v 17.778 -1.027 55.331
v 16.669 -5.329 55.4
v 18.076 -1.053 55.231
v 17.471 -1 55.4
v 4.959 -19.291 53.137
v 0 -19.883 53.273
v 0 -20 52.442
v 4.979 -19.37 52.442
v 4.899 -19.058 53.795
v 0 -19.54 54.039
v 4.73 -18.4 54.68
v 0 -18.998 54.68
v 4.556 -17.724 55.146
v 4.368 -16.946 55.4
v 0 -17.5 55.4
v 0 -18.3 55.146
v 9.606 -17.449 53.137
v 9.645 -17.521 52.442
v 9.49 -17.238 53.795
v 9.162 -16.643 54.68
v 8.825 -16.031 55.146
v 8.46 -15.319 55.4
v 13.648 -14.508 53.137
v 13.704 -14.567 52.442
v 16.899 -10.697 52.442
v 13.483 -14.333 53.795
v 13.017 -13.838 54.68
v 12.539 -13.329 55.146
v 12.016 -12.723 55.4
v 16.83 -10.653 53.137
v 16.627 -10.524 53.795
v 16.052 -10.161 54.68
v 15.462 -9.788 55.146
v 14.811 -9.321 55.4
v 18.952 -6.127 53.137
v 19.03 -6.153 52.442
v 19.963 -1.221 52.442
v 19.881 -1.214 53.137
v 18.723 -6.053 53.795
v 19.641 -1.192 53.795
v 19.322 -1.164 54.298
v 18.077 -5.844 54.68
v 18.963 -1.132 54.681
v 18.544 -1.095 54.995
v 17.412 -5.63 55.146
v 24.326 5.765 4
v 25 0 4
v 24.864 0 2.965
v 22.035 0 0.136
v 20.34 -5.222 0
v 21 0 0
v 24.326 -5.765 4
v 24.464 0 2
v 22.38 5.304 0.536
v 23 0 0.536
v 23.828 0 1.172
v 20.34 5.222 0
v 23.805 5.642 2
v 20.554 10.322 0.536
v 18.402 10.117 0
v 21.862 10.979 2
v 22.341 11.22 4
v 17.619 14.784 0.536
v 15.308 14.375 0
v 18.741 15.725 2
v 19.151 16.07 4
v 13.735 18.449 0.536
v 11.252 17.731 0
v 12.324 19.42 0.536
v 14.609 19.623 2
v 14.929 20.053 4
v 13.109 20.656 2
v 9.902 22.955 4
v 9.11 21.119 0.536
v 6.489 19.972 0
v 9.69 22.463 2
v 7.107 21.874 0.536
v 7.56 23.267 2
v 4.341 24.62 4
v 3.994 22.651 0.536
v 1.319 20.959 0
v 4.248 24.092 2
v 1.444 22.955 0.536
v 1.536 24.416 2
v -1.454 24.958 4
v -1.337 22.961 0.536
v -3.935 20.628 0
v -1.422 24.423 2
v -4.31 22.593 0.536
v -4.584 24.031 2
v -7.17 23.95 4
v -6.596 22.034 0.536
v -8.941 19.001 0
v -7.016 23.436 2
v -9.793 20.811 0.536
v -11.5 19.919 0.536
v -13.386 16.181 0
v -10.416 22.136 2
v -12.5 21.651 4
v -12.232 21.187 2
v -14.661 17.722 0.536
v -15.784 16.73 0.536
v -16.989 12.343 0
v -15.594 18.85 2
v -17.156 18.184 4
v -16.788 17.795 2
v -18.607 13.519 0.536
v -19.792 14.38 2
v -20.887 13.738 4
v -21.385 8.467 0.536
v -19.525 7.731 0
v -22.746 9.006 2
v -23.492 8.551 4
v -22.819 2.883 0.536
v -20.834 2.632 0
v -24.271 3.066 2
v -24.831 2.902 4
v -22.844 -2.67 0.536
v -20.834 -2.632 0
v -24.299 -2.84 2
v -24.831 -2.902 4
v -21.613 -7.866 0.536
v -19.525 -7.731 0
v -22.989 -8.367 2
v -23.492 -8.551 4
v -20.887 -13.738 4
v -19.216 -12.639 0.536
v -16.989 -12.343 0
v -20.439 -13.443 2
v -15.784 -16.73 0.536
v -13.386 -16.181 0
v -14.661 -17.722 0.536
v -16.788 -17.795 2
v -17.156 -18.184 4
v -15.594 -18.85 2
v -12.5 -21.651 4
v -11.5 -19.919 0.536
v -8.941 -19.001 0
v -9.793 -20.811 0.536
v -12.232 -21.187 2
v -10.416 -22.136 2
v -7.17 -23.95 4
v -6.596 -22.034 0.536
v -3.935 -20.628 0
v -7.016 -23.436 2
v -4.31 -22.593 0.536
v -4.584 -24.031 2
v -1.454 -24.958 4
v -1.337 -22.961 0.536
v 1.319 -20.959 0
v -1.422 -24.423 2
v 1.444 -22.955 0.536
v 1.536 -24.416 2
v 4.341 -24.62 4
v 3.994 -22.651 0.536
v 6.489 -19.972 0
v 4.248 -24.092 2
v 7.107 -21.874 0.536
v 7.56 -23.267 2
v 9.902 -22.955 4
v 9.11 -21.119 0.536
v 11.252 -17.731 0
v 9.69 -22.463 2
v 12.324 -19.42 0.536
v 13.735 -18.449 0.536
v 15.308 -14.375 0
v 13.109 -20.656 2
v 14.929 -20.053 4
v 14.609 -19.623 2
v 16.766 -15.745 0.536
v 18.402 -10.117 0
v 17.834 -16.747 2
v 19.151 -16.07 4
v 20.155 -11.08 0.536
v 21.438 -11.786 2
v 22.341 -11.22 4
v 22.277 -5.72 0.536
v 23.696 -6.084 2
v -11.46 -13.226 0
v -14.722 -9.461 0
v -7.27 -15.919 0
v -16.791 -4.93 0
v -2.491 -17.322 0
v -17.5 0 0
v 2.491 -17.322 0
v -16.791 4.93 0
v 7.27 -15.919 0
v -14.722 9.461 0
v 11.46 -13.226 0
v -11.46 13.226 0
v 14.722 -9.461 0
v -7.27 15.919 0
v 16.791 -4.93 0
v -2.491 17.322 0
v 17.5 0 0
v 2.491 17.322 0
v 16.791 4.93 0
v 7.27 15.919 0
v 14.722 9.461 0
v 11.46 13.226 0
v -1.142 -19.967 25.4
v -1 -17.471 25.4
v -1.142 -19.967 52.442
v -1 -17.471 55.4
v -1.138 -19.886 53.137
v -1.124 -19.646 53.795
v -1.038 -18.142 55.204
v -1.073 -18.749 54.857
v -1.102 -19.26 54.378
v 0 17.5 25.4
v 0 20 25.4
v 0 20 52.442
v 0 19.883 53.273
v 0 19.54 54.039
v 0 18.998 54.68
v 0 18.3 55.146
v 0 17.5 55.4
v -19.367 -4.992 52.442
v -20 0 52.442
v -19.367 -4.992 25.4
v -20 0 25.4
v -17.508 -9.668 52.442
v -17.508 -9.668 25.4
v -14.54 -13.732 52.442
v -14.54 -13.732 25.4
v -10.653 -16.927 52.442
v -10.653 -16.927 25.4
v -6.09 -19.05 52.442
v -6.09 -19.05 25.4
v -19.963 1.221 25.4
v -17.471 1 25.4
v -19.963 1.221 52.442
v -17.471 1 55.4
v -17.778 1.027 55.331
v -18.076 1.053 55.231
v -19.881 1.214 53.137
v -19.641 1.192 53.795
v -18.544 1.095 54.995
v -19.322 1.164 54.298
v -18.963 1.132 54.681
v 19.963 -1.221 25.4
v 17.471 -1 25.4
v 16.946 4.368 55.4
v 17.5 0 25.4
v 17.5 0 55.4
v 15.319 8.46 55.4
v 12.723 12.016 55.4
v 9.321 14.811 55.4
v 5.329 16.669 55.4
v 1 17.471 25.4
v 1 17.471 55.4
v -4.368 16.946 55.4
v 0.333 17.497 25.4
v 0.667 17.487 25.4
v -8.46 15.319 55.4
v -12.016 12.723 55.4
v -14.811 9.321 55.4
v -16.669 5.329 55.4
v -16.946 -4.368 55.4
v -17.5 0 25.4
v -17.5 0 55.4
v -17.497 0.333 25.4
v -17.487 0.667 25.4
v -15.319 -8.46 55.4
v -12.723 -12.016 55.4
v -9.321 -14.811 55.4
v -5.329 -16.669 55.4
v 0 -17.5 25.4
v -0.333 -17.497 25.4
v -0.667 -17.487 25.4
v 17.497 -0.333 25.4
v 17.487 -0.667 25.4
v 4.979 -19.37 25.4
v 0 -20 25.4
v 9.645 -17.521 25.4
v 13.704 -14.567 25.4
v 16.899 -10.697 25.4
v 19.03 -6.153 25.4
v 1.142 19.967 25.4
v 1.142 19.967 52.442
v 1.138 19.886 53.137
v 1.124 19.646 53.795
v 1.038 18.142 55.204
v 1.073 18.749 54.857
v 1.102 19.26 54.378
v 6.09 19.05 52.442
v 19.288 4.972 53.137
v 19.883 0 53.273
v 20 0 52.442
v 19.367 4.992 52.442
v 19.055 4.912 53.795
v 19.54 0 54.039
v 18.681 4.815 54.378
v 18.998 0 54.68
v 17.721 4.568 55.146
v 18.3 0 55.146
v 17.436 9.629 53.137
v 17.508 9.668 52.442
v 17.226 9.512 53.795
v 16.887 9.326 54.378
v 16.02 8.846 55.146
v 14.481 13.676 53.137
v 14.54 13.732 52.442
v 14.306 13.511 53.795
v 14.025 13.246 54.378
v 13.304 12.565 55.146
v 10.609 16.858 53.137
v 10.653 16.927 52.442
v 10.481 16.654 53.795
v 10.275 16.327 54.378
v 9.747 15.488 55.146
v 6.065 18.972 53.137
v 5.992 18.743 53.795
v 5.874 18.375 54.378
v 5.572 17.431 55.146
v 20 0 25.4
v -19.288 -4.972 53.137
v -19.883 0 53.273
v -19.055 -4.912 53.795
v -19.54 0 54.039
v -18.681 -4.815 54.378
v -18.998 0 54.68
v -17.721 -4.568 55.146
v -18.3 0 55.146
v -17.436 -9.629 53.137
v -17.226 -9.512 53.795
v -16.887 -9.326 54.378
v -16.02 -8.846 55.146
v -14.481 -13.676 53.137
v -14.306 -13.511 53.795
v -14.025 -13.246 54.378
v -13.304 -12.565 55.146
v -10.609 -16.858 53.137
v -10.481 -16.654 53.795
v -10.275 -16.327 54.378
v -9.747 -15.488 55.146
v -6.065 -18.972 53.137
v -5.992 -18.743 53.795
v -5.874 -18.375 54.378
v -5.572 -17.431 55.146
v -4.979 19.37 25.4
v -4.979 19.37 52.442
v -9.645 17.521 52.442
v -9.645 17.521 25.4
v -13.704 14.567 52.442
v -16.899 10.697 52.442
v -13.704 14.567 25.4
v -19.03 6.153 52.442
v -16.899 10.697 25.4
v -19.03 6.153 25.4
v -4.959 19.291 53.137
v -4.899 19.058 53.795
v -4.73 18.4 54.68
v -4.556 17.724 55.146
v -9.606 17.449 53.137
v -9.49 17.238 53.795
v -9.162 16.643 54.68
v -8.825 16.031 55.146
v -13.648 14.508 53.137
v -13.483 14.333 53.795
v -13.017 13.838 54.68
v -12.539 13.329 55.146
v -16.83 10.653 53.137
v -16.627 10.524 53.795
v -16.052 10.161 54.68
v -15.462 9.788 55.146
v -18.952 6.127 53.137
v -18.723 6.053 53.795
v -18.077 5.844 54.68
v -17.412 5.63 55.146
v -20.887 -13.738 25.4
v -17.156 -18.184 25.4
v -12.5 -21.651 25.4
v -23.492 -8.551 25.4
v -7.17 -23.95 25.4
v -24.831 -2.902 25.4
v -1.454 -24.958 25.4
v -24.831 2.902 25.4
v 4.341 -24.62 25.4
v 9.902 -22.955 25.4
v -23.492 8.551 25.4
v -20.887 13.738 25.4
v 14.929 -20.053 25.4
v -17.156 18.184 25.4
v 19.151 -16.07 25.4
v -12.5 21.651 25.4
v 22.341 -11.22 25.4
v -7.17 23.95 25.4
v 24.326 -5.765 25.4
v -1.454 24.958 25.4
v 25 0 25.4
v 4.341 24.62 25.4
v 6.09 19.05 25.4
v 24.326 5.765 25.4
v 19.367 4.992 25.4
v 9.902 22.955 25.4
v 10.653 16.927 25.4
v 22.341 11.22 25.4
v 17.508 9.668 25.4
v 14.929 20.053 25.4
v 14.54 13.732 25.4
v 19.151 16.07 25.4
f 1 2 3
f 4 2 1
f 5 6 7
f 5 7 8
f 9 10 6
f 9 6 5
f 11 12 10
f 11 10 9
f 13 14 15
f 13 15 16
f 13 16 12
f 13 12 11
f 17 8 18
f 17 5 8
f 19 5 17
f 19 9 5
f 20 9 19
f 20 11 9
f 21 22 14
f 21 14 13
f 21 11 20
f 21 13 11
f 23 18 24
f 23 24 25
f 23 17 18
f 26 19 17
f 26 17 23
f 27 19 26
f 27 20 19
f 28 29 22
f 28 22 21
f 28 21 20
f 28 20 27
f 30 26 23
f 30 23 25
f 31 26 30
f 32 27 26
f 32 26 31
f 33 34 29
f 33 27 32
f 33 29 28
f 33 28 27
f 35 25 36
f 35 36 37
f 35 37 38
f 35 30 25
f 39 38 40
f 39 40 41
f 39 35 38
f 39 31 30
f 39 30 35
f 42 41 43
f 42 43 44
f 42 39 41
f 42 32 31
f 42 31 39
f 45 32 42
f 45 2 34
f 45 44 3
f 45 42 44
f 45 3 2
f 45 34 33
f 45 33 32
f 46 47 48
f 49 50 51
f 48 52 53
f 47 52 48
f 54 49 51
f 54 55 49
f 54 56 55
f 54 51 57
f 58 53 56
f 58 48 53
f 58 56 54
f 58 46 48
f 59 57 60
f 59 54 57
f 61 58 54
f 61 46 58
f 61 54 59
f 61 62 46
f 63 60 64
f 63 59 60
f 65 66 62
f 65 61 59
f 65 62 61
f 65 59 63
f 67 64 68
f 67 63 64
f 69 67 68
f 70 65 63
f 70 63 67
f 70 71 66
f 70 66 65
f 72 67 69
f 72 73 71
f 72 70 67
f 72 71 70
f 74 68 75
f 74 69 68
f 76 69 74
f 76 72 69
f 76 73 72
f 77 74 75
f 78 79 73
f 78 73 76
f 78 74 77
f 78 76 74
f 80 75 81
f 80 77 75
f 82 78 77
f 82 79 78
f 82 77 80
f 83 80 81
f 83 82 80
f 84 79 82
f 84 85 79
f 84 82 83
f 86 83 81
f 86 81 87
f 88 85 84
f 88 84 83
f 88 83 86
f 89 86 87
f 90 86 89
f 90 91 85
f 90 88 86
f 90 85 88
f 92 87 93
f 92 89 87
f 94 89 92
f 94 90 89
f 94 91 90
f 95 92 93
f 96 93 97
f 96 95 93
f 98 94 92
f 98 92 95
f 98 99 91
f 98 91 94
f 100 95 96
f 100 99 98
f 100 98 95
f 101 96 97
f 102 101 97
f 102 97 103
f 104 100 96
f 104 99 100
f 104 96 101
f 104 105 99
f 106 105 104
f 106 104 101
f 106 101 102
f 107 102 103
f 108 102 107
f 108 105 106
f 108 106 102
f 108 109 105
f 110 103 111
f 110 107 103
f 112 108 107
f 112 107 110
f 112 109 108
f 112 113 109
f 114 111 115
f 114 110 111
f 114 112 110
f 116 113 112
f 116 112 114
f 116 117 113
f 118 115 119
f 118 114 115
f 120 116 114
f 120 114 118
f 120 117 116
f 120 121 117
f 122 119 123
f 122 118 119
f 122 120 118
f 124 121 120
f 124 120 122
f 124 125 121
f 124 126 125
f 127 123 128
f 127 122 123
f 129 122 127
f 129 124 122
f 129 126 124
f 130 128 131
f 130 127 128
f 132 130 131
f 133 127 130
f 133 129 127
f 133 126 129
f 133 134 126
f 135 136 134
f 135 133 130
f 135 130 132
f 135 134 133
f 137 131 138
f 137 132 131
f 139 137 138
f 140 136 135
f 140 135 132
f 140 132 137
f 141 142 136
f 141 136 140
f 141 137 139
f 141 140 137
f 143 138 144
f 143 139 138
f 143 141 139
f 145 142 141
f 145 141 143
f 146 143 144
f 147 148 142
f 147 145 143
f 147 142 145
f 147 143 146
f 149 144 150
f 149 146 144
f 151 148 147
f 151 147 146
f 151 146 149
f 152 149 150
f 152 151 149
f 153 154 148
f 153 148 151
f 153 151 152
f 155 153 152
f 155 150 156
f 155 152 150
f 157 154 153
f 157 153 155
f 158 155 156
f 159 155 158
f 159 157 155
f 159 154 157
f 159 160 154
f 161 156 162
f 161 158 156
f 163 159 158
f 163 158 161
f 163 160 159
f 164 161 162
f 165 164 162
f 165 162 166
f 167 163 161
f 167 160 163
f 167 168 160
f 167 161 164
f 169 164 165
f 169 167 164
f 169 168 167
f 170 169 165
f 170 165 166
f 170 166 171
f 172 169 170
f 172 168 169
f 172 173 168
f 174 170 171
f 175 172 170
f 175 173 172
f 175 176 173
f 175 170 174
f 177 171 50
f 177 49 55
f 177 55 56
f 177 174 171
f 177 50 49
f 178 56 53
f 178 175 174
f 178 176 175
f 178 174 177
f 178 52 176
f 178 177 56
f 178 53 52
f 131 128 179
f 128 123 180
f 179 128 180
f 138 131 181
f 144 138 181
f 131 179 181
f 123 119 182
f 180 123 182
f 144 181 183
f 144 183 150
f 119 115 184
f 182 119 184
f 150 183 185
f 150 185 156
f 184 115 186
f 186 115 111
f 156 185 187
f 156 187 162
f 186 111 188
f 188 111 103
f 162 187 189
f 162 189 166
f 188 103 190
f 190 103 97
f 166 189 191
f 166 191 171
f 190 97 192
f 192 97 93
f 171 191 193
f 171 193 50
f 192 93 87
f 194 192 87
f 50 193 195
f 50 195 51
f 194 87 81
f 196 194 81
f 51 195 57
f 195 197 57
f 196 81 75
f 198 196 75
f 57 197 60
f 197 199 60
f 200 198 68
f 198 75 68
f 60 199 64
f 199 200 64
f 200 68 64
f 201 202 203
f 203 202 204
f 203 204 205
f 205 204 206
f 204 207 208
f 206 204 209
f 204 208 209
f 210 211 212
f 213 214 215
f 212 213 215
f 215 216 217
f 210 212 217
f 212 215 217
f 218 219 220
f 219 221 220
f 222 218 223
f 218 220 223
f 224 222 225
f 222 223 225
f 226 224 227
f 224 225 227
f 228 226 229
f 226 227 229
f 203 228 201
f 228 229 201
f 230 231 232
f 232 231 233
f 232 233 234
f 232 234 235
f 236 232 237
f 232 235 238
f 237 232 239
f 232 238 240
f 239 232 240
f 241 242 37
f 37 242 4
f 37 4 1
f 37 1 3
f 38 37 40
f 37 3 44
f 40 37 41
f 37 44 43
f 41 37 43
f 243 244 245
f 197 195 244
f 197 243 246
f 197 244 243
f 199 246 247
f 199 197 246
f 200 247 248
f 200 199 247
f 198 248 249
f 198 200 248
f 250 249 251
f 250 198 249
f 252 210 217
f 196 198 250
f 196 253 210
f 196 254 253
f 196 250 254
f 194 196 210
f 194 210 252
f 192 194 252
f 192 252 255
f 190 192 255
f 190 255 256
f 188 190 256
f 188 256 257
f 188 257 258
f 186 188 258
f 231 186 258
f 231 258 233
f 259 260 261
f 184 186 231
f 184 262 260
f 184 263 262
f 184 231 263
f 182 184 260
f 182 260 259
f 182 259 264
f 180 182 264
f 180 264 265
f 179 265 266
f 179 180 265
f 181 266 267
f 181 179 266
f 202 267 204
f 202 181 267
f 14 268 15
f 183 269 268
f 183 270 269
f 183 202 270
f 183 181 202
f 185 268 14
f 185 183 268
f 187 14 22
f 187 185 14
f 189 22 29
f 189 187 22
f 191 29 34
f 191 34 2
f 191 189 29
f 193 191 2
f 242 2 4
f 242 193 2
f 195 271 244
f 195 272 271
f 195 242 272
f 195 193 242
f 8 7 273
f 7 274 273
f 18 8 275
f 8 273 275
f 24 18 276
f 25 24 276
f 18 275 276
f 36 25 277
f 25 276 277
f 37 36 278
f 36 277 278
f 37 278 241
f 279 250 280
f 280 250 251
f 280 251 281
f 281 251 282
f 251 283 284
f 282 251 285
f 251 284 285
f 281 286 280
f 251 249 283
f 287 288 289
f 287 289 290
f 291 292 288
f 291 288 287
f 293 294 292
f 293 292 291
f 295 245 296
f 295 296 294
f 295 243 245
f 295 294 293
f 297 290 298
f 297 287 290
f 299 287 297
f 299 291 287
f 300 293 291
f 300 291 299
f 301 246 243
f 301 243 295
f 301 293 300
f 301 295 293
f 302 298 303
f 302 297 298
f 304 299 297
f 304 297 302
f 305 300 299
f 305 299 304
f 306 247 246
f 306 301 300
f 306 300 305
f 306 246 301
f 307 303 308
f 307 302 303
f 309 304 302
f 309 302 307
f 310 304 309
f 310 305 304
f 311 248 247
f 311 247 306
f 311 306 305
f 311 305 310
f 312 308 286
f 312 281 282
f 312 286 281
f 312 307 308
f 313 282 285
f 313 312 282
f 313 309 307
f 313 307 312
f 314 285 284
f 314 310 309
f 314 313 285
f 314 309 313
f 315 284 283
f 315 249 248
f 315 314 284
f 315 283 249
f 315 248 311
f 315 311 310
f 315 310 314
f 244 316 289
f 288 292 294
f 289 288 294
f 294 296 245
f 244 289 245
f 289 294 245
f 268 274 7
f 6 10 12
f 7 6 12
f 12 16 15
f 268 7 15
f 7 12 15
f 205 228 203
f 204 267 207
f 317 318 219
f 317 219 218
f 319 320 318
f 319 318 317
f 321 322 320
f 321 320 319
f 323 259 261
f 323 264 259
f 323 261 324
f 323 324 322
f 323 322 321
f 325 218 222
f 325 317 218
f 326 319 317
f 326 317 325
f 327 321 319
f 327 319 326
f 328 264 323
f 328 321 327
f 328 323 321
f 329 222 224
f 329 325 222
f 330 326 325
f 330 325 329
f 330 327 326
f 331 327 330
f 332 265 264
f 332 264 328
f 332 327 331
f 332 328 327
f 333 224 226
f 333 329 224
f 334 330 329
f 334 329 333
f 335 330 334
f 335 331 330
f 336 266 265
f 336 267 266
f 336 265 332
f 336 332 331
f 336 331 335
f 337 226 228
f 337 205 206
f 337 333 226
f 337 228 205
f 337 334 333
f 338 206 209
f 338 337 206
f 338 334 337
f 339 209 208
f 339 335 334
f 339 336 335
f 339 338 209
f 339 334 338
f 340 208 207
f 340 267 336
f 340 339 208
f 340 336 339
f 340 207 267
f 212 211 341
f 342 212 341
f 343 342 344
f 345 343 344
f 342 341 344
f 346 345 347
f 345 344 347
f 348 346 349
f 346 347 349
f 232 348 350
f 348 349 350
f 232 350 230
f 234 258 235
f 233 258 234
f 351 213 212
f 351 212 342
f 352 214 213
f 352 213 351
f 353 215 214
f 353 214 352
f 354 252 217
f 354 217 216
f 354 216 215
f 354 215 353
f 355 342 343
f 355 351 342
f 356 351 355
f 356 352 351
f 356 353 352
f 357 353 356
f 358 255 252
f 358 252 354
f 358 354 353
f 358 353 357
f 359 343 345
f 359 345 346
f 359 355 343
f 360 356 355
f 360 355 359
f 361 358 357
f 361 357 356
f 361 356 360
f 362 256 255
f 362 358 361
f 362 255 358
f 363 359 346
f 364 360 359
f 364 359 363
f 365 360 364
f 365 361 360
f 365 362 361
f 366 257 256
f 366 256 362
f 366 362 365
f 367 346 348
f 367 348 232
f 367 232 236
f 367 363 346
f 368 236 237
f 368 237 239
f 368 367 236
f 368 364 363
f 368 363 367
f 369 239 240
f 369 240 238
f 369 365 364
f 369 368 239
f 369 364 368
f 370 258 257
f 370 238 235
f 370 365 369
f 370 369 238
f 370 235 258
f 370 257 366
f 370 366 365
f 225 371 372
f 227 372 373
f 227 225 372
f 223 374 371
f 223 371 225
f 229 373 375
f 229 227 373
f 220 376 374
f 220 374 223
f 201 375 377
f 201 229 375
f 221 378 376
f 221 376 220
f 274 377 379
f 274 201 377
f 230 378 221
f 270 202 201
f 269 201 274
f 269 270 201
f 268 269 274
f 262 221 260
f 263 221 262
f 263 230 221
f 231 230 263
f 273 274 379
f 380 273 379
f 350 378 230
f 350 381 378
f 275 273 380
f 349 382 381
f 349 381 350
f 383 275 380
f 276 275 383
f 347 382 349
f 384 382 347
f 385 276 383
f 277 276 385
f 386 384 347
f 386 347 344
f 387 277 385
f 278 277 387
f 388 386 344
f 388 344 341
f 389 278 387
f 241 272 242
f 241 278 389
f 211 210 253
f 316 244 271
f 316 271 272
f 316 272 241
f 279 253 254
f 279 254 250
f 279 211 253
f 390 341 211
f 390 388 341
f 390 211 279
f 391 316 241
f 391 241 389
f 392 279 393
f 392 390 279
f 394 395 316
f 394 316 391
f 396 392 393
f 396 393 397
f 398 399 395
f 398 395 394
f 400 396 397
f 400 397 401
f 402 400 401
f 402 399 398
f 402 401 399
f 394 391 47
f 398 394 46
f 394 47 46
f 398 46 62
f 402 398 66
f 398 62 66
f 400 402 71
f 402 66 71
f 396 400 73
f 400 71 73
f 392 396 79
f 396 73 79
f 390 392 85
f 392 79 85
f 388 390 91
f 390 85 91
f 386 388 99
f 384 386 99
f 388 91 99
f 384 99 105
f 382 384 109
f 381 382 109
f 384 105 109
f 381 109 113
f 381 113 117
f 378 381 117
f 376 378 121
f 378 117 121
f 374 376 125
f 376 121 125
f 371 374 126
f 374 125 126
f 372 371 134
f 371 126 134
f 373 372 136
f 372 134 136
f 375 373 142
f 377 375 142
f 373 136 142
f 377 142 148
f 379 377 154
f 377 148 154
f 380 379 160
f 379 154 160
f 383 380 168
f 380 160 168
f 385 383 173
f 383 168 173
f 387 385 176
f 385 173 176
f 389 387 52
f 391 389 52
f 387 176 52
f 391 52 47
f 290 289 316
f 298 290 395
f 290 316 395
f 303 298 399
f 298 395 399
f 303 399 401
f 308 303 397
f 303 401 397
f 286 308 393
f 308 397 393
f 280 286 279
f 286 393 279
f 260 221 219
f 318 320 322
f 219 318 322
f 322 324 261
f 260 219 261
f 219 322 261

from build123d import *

# Parameters (mm, degrees)
F0_R        = 25
F0_R_2      = 20
F0_R_3      = 17.5
F1_DEPTH    = 25.4
F2_DEPTH    = 55.4
F4_DEPTH    = 30
F5_T2_ANGLE = 128.886649626
F5_T4_ANGLE = 129.1121145727
F5_T6_ANGLE = 128.886649626
F5_T8_ANGLE = 129.1121145727
F6_R        = 4


# Not quite as in the source:
# - a fillet or chamfer that OpenCascade refuses, or shapes differently, is made with other operations: its cross-section is extruded or revolved along the edge and cut away or added


with BuildPart() as f1:
    # F0 (on Top) → F1 (new body)
    with BuildSketch(Plane.XY):
        Circle(F0_R)
        Circle(F0_R_2, mode=Mode.SUBTRACT)
        Circle(F0_R_2)
        Circle(F0_R_3, mode=Mode.SUBTRACT)
    extrude(amount=F1_DEPTH)

    # F0 (on Top) → F2 (join)
    with BuildSketch(Plane.XY):
        Circle(F0_R_2)
        Circle(F0_R_3, mode=Mode.SUBTRACT)
    extrude(amount=F2_DEPTH)

    # F3 (on face) → F4 (cut)
    with BuildSketch(Plane.XY.offset(55.4)):
        with BuildLine():
            Line((0, 20), (0, 17.5))
            ThreePointArc((0, 17.5), (0.5, 17.4928556845), (0.9995917534, 17.4714285714))
            Line((0.9995917534, 17.4714285714), (1.1423905753, 19.9673469388))
            ThreePointArc((1.1423905753, 19.9673469388), (0.5714285714, 19.991835068), (0, 20))
        make_face()
        with BuildLine():
            Line((20, 0), (17.5, 0))
            ThreePointArc((17.5, 0), (17.4928556845, -0.5), (17.4714285714, -0.9995917534))
            Line((17.4714285714, -0.9995917534), (19.9626986738, -1.2209265568))
            ThreePointArc((19.9626986738, -1.2209265568), (19.9906724934, -0.6107481163), (20, 0))
        make_face()
        with BuildLine():
            ThreePointArc((-17.5, 0), (-17.4928556845, 0.5), (-17.4714285714, 0.9995917534))
            Line((-17.4714285714, 0.9995917534), (-19.9626986738, 1.2209265568))
            ThreePointArc((-19.9626986738, 1.2209265568), (-19.9906724934, 0.6107481163), (-20, 0))
            Line((-20, 0), (-17.5, 0))
        make_face()
        with BuildLine():
            ThreePointArc((0, -17.5), (-0.5, -17.4928556845), (-0.9995917534, -17.4714285714))
            Line((-0.9995917534, -17.4714285714), (-1.1423905753, -19.9673469388))
            ThreePointArc((-1.1423905753, -19.9673469388), (-0.5714285714, -19.991835068), (0, -20))
            Line((0, -20), (0, -17.5))
        make_face()
    extrude(amount=-F4_DEPTH, mode=Mode.SUBTRACT)

    # F5: fillet of radius 3 on 4 edges, made by hand

    # F5_s1 → F5_t2 (revolve, cut)
    with BuildSketch(Plane(origin=(0, 0, 0), x_dir=(0, 0, 1), z_dir=(0.9323663261, -0.3615149152, 0))):
        with BuildLine():
            ThreePointArc((52.4419601084, -20), (54.3784517816, -19.2912878475), (55.4, -17.5))
            Line((55.4, -17.5), (55.4, -20))
            Line((55.4, -20), (52.4419601084, -20))
        make_face()
    revolve(axis=Axis((0, 0, 55.4), (0, 0, 1)), revolution_arc=F5_T2_ANGLE, mode=Mode.SUBTRACT)

    # F5_s3 → F5_t4 (revolve, cut)
    with BuildSketch(Plane(origin=(0, 0, 0), x_dir=(0, 0, 1), z_dir=(0.3615155829, 0.9323660672, 0))):
        with BuildLine():
            ThreePointArc((52.4419601084, -20), (54.3784517816, -19.2912878475), (55.4, -17.5))
            Line((55.4, -17.5), (55.4, -20))
            Line((55.4, -20), (52.4419601084, -20))
        make_face()
    revolve(axis=Axis((0, 0, 55.4), (0, 0, 1)), revolution_arc=F5_T4_ANGLE, mode=Mode.SUBTRACT)

    # F5_s5 → F5_t6 (revolve, cut)
    with BuildSketch(Plane(origin=(0, 0, 0), x_dir=(0, 0, 1), z_dir=(-0.9323663261, 0.3615149152, 0))):
        with BuildLine():
            ThreePointArc((52.4419601084, -20), (54.3784517816, -19.2912878475), (55.4, -17.5))
            Line((55.4, -17.5), (55.4, -20))
            Line((55.4, -20), (52.4419601084, -20))
        make_face()
    revolve(axis=Axis((0, 0, 55.4), (0, 0, 1)), revolution_arc=F5_T6_ANGLE, mode=Mode.SUBTRACT)

    # F5_s7 → F5_t8 (revolve, cut)
    with BuildSketch(Plane(origin=(0, 0, 0), x_dir=(0, 0, 1), z_dir=(-0.3615155829, -0.9323660672, 0))):
        with BuildLine():
            ThreePointArc((52.4419601084, -20), (54.3784517816, -19.2912878475), (55.4, -17.5))
            Line((55.4, -17.5), (55.4, -20))
            Line((55.4, -20), (52.4419601084, -20))
        make_face()
    revolve(axis=Axis((0, 0, 55.4), (0, 0, 1)), revolution_arc=F5_T8_ANGLE, mode=Mode.SUBTRACT)

    # F6
    f6_edges = [f1.edges().sort_by_distance(p)[0] for p in [
        (-25, 0, 0),
    ]]
    fillet(f6_edges, radius=F6_R)


solid = f1.part
